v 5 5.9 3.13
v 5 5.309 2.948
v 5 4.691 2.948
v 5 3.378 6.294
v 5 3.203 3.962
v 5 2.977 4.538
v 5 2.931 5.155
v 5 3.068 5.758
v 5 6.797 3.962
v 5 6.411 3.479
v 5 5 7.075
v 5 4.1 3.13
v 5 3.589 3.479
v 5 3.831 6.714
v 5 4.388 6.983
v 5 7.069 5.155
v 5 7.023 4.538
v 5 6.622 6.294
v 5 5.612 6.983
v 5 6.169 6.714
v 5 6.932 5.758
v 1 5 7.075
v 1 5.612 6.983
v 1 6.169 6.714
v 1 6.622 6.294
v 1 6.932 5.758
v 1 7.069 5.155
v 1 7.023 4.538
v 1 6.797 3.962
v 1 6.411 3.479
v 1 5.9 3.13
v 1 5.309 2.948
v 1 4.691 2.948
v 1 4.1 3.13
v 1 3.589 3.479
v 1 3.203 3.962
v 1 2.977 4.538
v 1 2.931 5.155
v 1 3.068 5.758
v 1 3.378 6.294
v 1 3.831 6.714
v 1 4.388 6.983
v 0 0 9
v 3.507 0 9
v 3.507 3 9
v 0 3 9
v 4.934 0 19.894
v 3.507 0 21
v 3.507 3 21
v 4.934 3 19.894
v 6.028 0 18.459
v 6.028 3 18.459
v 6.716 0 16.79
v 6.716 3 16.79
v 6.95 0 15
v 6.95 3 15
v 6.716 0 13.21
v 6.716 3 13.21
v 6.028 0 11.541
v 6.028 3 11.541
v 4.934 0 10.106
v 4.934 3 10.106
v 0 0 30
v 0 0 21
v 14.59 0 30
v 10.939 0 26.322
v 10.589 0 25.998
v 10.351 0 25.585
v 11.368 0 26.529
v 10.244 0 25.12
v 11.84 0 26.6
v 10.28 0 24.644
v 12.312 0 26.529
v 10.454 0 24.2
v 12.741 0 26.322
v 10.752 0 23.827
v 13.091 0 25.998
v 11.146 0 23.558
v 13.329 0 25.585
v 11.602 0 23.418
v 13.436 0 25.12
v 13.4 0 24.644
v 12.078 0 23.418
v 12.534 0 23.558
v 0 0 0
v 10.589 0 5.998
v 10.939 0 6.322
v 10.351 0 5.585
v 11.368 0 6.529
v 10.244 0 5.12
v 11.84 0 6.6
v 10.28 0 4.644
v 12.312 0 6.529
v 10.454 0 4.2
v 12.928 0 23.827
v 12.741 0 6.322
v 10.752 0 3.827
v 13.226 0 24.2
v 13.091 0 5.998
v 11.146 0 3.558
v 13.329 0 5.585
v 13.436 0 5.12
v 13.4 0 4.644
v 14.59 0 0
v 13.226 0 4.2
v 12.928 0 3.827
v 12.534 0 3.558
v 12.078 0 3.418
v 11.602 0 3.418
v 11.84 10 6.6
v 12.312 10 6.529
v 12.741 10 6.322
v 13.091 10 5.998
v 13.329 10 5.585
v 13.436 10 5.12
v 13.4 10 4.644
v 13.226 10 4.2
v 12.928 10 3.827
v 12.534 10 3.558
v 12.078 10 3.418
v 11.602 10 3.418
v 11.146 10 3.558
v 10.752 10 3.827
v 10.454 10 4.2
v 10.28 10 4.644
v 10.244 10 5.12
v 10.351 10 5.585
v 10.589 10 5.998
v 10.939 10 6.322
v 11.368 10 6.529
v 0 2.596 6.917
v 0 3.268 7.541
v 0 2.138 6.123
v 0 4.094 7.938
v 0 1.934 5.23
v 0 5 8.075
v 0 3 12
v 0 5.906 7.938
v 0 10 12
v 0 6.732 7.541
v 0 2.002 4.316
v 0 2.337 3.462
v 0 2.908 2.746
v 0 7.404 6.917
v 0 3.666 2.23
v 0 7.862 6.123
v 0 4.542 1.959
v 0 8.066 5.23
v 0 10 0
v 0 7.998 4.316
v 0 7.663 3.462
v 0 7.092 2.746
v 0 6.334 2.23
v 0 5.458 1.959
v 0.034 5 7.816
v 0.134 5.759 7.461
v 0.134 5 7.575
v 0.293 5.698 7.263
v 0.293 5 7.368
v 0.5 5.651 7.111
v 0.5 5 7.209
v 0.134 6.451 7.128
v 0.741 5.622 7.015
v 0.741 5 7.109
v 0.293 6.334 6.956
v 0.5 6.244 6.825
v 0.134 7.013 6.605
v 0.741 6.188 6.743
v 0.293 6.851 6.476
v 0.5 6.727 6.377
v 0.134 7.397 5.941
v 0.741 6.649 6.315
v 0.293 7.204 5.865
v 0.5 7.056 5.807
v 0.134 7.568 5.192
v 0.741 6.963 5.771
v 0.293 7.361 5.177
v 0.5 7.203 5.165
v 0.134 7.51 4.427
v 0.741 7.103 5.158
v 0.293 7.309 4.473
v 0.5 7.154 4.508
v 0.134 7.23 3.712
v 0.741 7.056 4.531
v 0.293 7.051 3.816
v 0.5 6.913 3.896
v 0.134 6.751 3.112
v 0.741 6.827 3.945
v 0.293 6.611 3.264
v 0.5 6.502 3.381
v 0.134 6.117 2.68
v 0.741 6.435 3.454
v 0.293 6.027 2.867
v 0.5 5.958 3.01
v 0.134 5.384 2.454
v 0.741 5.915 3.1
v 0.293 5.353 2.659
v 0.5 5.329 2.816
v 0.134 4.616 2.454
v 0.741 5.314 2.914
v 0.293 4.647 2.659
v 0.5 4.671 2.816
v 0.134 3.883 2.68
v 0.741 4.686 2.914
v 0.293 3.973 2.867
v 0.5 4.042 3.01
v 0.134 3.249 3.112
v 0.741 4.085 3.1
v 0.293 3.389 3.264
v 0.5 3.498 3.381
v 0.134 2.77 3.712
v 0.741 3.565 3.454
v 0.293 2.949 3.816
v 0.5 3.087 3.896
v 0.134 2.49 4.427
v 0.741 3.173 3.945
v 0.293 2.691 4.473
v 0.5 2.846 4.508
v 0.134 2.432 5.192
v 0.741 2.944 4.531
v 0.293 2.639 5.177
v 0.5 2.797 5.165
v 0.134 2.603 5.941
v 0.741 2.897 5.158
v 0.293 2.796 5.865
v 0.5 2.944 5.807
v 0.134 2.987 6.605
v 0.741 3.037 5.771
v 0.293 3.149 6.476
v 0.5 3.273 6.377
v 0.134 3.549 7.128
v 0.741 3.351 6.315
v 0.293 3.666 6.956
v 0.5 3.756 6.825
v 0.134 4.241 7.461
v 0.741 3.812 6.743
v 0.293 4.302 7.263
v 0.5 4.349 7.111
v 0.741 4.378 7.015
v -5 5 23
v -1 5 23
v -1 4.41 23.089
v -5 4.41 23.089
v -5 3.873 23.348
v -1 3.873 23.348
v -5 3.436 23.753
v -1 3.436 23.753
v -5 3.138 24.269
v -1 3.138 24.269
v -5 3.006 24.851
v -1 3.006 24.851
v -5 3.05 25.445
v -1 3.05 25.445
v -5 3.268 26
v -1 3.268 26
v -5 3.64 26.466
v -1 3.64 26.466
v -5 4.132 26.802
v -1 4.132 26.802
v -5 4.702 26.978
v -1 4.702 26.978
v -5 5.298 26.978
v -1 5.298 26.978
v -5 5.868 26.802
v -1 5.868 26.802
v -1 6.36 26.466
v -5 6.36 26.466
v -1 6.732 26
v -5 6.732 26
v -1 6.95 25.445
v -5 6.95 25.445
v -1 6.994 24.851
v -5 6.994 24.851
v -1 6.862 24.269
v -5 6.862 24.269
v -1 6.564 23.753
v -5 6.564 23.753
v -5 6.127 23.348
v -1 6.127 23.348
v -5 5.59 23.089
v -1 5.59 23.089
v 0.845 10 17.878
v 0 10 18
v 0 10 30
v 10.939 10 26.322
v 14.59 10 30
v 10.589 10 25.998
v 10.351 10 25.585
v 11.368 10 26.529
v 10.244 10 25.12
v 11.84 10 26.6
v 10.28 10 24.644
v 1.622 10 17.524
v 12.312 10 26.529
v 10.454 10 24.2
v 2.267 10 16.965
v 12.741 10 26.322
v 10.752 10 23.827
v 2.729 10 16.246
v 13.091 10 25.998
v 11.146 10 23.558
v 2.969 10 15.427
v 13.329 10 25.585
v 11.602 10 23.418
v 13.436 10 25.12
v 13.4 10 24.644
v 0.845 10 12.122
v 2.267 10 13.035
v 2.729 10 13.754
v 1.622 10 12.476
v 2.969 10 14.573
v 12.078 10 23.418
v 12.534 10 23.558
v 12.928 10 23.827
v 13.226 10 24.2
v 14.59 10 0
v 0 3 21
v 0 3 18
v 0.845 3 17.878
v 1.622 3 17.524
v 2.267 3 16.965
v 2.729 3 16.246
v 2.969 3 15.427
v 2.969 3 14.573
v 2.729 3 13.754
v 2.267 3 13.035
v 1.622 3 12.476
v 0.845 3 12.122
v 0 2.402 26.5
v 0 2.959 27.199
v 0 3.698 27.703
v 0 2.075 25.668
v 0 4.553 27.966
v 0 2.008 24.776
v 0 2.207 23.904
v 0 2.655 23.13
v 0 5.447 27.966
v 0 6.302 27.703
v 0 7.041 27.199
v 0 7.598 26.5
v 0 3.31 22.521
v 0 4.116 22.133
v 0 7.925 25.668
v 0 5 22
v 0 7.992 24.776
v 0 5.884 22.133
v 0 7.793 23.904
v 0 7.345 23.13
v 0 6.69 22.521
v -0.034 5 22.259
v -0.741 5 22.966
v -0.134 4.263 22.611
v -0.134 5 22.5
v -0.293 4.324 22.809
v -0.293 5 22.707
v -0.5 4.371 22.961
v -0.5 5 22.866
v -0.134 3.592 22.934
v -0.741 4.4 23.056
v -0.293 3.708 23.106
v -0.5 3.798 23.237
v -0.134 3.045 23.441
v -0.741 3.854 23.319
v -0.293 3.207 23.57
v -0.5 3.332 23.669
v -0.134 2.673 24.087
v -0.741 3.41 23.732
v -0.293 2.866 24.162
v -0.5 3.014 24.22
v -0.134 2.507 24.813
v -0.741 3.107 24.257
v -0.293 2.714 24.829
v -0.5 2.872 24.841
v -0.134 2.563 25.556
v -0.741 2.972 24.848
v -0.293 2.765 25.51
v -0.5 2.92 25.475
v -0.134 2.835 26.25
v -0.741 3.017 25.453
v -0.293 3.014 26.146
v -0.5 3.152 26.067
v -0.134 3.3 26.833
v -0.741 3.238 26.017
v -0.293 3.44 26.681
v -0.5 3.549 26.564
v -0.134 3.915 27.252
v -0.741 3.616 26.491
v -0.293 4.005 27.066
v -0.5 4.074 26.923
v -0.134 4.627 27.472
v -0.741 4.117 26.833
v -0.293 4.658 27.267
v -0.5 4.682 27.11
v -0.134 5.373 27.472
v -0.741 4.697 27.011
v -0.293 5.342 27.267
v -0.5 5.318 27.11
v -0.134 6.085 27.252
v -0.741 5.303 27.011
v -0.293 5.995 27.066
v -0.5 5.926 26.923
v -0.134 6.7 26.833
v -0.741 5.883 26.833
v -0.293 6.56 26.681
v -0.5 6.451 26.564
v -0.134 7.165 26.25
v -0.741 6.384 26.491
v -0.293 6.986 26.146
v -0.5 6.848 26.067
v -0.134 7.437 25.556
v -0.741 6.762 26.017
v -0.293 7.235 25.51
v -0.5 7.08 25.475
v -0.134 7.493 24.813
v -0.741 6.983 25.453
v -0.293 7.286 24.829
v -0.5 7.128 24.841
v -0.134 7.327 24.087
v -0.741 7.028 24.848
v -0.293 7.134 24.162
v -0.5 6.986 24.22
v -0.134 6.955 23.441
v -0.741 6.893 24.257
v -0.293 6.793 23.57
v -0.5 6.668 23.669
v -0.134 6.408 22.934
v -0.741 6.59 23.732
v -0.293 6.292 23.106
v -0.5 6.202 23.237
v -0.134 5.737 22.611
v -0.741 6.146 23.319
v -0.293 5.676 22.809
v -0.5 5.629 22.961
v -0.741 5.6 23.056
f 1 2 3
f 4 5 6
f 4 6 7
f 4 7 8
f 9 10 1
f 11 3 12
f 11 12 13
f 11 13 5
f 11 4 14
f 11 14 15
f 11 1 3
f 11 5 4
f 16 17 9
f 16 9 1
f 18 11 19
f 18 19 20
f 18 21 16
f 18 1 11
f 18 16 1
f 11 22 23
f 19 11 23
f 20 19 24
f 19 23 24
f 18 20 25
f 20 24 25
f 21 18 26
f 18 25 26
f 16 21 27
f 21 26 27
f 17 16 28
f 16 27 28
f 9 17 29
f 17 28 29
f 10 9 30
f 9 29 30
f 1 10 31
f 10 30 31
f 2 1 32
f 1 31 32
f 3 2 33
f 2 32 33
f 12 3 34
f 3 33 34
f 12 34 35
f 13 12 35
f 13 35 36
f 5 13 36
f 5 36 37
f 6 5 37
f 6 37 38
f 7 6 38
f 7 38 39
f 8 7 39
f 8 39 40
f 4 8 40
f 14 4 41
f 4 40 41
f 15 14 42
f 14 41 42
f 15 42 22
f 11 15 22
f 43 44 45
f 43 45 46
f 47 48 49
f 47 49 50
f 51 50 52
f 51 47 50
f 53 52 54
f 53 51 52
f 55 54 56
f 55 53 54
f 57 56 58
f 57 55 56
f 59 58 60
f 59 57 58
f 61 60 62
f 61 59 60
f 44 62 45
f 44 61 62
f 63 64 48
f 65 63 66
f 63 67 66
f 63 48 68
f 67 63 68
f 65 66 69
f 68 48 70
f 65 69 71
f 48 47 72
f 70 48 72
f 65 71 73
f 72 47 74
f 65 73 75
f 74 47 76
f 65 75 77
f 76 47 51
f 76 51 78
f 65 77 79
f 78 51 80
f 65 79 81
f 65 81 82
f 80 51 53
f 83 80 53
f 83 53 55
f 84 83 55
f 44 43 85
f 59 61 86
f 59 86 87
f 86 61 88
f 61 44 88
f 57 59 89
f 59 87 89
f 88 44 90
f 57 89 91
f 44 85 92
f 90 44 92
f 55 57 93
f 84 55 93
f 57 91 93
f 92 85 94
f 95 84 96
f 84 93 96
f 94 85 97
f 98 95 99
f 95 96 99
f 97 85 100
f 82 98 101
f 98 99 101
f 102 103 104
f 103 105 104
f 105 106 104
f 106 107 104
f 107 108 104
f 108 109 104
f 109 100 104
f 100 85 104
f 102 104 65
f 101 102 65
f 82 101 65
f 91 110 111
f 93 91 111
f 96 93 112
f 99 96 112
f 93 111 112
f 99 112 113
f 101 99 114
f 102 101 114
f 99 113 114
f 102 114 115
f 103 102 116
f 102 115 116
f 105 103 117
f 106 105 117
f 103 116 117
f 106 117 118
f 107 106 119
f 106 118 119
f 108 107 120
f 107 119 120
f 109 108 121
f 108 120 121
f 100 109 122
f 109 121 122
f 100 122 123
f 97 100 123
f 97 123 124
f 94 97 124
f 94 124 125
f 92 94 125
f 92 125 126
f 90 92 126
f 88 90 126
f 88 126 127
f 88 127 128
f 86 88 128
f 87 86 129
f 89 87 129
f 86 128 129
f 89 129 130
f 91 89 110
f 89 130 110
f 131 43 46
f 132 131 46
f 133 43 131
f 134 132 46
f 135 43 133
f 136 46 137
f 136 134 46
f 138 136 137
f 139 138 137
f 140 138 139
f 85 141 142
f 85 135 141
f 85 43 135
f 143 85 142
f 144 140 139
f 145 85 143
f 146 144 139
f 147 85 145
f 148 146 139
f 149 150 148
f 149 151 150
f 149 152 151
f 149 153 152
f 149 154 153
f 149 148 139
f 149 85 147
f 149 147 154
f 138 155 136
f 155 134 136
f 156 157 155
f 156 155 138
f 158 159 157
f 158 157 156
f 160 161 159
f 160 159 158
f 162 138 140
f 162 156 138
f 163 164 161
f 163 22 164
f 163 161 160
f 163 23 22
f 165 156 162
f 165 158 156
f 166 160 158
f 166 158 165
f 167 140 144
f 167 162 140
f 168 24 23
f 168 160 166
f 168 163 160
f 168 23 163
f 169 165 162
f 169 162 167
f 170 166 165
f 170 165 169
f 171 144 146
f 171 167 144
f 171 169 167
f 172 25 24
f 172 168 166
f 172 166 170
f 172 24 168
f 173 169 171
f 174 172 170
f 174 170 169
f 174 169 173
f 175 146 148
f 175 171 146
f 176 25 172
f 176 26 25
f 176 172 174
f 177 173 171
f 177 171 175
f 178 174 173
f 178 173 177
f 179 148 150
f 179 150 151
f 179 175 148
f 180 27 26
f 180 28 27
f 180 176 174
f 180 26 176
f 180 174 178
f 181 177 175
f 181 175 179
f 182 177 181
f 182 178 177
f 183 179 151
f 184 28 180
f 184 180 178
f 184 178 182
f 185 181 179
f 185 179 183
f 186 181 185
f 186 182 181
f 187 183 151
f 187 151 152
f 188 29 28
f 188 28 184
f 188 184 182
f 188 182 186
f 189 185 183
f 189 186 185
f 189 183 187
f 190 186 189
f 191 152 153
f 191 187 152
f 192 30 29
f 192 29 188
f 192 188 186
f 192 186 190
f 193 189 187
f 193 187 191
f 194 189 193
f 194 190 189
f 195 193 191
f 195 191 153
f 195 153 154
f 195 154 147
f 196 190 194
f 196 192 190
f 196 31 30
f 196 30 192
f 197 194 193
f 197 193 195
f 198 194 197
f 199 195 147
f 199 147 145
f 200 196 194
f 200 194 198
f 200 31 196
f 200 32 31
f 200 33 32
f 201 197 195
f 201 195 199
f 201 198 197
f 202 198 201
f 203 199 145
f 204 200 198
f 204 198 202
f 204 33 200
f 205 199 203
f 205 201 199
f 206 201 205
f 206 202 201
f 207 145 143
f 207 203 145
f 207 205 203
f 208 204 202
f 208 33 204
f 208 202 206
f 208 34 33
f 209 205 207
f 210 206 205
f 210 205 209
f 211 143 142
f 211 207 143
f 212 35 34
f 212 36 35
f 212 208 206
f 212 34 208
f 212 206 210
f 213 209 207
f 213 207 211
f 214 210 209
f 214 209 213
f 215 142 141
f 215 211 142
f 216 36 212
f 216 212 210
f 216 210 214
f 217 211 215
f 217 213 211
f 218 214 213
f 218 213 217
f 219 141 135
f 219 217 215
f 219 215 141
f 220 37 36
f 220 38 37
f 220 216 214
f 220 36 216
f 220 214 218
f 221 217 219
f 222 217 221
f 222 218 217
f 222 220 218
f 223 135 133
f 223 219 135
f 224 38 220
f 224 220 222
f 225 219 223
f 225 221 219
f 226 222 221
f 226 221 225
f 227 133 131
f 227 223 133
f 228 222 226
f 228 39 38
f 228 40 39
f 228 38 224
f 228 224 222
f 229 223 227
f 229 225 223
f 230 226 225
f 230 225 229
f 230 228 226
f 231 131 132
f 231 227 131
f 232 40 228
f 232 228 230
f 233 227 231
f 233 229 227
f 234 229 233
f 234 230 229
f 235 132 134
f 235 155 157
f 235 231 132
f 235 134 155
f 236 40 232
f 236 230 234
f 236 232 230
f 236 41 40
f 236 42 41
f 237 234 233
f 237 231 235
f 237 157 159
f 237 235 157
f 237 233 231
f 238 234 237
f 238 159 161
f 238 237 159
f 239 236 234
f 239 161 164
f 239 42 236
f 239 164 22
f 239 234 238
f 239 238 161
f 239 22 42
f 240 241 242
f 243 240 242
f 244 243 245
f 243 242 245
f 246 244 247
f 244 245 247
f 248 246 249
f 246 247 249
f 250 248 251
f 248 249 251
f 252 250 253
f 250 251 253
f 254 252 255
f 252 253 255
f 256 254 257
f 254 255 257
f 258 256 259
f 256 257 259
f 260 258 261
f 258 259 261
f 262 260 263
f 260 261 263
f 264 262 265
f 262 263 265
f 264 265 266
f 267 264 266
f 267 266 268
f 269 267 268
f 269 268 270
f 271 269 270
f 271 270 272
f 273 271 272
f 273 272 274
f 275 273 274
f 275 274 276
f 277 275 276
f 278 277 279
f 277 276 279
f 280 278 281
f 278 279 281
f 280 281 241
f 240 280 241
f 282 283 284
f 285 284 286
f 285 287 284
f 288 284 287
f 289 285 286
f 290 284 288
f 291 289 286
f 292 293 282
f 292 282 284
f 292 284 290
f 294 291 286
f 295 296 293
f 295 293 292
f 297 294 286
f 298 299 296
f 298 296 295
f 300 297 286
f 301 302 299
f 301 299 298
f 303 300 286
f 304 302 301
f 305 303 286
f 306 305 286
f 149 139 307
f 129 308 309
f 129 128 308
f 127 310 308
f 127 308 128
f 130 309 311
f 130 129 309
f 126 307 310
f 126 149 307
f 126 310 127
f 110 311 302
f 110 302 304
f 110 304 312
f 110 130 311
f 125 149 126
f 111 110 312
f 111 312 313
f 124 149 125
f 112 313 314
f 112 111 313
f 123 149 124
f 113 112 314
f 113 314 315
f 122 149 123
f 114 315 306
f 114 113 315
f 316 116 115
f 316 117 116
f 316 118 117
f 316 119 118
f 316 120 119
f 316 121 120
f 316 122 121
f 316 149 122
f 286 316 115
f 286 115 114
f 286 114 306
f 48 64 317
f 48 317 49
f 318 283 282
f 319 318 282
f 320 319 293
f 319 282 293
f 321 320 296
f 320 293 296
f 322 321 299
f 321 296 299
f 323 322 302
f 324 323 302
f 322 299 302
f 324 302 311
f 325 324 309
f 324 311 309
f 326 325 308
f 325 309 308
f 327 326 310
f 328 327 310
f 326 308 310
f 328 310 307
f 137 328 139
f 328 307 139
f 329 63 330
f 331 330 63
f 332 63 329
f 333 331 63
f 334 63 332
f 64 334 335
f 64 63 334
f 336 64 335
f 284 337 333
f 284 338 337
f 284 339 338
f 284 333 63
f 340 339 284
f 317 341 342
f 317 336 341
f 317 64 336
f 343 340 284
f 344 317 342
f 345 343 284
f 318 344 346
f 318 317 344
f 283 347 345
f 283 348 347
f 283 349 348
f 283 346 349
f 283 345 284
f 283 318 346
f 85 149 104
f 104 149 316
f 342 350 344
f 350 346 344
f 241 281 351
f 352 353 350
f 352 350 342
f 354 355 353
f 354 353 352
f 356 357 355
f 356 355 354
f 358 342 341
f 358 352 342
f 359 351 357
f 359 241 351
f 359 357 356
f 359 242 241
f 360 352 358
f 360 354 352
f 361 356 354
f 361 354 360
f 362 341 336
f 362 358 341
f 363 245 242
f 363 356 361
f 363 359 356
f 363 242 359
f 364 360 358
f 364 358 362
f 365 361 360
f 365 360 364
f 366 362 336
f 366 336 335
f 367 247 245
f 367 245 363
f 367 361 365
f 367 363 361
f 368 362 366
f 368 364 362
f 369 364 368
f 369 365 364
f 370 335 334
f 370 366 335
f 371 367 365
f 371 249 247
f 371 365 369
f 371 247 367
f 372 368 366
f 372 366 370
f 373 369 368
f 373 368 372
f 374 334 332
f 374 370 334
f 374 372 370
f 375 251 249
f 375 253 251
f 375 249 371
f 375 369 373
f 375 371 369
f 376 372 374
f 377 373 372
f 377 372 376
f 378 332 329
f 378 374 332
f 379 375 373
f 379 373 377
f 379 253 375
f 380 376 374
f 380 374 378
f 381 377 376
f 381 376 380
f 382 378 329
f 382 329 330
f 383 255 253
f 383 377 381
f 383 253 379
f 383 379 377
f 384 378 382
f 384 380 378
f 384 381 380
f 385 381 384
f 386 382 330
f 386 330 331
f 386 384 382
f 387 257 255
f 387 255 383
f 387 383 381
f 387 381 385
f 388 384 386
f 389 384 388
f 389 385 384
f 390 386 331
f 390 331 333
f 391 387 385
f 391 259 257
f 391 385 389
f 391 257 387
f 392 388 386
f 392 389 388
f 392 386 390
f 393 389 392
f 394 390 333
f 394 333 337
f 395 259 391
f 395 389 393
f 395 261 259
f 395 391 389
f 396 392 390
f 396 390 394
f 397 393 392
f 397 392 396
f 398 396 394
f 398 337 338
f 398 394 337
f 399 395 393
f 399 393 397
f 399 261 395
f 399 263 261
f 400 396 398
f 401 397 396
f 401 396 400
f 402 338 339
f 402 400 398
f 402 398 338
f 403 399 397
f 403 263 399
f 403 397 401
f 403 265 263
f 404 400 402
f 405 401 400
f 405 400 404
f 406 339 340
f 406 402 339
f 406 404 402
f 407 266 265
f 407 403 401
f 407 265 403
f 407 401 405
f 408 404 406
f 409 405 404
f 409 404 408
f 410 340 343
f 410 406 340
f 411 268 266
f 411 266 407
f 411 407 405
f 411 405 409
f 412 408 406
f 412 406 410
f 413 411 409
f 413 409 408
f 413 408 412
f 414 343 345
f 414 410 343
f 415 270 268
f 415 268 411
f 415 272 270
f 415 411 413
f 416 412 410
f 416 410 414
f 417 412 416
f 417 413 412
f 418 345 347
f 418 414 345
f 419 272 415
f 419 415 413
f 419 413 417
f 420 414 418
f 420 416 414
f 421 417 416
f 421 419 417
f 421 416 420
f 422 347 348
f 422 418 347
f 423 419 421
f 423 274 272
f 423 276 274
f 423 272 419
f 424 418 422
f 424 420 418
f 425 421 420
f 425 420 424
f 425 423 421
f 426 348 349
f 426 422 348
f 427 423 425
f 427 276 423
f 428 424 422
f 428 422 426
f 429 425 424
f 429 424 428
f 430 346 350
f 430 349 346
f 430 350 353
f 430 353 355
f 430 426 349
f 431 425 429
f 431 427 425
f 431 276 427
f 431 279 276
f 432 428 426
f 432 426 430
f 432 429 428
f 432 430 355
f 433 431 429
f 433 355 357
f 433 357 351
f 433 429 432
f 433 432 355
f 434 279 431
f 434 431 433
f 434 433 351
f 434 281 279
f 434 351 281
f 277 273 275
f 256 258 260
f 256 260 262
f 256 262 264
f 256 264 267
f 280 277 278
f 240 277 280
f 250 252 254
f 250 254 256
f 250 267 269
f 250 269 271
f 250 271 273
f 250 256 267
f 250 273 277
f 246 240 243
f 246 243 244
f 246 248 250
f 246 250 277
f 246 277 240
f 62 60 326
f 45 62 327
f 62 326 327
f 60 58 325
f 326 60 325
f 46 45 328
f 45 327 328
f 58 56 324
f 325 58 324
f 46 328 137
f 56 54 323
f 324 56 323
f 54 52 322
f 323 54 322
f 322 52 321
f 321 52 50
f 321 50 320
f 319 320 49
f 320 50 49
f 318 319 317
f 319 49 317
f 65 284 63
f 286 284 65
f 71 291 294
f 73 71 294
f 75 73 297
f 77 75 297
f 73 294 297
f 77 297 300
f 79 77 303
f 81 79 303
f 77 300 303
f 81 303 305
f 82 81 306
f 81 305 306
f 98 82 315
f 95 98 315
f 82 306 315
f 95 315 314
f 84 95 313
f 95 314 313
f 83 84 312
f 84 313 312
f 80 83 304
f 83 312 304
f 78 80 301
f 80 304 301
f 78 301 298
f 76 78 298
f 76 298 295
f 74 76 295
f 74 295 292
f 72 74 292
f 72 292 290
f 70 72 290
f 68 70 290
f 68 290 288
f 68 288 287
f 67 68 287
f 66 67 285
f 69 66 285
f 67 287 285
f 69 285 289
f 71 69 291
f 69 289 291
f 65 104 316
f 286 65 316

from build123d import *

# Parameters (mm, degrees)
SKETCH1_W           = 14.59
SKETCH1_H           = 10
BOSS_EXTRUDE1_DEPTH = 30
CUT_EXTRUDE1_DEPTH  = 3
SKETCH3_R           = 1.6
CUT_EXTRUDE2_DEPTH  = 10
CUT_EXTRUDE3_DEPTH  = 7
SKETCH5_R           = 2
BOSS_EXTRUDE2_DEPTH = 5
FILLET1_R           = 1
SKETCH6_R           = 2.075
CUT_EXTRUDE4_DEPTH  = 5
FILLET2_R           = 1


with BuildPart() as part:
    # Sketch1 → Boss-Extrude1 (new body)
    with BuildSketch(Plane.XY):
        with Locations((7.295, 5)):
            Rectangle(SKETCH1_W, SKETCH1_H)
    extrude(amount=BOSS_EXTRUDE1_DEPTH)

    # Sketch2 → Cut-Extrude1 (cut)
    with BuildSketch(Plane.XZ):
        with BuildLine():
            Line((0, 21), (3.507491981, 21))
            ThreePointArc((3.507491981, 21), (6.95, 15), (3.507491981, 9))
            Line((3.507491981, 9), (0, 9))
            Line((0, 9), (0, 21))
        make_face()
    extrude(amount=-CUT_EXTRUDE1_DEPTH, mode=Mode.SUBTRACT)

    # Sketch3 → Cut-Extrude2 (cut)
    with BuildSketch(Plane(origin=(0, 10, 0), x_dir=(1, 0, 0), z_dir=(0, 1, 0))):
        with Locations(Location((11.84, -5, 0), (0, 0, 270))):
            Circle(SKETCH3_R)
        with Locations(Location((11.84, -25, 0), (0, 0, 270))):
            Circle(SKETCH3_R)
    extrude(amount=-CUT_EXTRUDE2_DEPTH, mode=Mode.SUBTRACT)

    # Sketch4 → Cut-Extrude3 (cut)
    with BuildSketch(Plane(origin=(0, 10, 0), x_dir=(1, 0, 0), z_dir=(0, 1, 0))):
        with BuildLine():
            Line((0, -12), (0, -18))
            ThreePointArc((0, -18), (3, -15), (0, -12))
        make_face()
    extrude(amount=-CUT_EXTRUDE3_DEPTH, mode=Mode.SUBTRACT)

    # Sketch5 → Boss-Extrude2 (add)
    with BuildSketch(Plane.ZY):
        with Locations(Location((25, 5, 0), (0, 0, 180))):
            Circle(SKETCH5_R)
    extrude(amount=BOSS_EXTRUDE2_DEPTH)

    # Fillet1
    fillet1_edges = [part.edges().sort_by_distance(p)[0] for p in [
        (0, 5, 27),
    ]]
    fillet(fillet1_edges, radius=FILLET1_R)

    # Sketch6 → Cut-Extrude4 (cut)
    with BuildSketch(Plane.ZY):
        with Locations((5, 5)):
            Circle(SKETCH6_R)
    extrude(amount=-CUT_EXTRUDE4_DEPTH, mode=Mode.SUBTRACT)

    # Fillet2
    fillet2_edges = [part.edges().sort_by_distance(p)[0] for p in [
        (0, 5, 2.925),
    ]]
    fillet(fillet2_edges, radius=FILLET2_R)


solid = part.part
